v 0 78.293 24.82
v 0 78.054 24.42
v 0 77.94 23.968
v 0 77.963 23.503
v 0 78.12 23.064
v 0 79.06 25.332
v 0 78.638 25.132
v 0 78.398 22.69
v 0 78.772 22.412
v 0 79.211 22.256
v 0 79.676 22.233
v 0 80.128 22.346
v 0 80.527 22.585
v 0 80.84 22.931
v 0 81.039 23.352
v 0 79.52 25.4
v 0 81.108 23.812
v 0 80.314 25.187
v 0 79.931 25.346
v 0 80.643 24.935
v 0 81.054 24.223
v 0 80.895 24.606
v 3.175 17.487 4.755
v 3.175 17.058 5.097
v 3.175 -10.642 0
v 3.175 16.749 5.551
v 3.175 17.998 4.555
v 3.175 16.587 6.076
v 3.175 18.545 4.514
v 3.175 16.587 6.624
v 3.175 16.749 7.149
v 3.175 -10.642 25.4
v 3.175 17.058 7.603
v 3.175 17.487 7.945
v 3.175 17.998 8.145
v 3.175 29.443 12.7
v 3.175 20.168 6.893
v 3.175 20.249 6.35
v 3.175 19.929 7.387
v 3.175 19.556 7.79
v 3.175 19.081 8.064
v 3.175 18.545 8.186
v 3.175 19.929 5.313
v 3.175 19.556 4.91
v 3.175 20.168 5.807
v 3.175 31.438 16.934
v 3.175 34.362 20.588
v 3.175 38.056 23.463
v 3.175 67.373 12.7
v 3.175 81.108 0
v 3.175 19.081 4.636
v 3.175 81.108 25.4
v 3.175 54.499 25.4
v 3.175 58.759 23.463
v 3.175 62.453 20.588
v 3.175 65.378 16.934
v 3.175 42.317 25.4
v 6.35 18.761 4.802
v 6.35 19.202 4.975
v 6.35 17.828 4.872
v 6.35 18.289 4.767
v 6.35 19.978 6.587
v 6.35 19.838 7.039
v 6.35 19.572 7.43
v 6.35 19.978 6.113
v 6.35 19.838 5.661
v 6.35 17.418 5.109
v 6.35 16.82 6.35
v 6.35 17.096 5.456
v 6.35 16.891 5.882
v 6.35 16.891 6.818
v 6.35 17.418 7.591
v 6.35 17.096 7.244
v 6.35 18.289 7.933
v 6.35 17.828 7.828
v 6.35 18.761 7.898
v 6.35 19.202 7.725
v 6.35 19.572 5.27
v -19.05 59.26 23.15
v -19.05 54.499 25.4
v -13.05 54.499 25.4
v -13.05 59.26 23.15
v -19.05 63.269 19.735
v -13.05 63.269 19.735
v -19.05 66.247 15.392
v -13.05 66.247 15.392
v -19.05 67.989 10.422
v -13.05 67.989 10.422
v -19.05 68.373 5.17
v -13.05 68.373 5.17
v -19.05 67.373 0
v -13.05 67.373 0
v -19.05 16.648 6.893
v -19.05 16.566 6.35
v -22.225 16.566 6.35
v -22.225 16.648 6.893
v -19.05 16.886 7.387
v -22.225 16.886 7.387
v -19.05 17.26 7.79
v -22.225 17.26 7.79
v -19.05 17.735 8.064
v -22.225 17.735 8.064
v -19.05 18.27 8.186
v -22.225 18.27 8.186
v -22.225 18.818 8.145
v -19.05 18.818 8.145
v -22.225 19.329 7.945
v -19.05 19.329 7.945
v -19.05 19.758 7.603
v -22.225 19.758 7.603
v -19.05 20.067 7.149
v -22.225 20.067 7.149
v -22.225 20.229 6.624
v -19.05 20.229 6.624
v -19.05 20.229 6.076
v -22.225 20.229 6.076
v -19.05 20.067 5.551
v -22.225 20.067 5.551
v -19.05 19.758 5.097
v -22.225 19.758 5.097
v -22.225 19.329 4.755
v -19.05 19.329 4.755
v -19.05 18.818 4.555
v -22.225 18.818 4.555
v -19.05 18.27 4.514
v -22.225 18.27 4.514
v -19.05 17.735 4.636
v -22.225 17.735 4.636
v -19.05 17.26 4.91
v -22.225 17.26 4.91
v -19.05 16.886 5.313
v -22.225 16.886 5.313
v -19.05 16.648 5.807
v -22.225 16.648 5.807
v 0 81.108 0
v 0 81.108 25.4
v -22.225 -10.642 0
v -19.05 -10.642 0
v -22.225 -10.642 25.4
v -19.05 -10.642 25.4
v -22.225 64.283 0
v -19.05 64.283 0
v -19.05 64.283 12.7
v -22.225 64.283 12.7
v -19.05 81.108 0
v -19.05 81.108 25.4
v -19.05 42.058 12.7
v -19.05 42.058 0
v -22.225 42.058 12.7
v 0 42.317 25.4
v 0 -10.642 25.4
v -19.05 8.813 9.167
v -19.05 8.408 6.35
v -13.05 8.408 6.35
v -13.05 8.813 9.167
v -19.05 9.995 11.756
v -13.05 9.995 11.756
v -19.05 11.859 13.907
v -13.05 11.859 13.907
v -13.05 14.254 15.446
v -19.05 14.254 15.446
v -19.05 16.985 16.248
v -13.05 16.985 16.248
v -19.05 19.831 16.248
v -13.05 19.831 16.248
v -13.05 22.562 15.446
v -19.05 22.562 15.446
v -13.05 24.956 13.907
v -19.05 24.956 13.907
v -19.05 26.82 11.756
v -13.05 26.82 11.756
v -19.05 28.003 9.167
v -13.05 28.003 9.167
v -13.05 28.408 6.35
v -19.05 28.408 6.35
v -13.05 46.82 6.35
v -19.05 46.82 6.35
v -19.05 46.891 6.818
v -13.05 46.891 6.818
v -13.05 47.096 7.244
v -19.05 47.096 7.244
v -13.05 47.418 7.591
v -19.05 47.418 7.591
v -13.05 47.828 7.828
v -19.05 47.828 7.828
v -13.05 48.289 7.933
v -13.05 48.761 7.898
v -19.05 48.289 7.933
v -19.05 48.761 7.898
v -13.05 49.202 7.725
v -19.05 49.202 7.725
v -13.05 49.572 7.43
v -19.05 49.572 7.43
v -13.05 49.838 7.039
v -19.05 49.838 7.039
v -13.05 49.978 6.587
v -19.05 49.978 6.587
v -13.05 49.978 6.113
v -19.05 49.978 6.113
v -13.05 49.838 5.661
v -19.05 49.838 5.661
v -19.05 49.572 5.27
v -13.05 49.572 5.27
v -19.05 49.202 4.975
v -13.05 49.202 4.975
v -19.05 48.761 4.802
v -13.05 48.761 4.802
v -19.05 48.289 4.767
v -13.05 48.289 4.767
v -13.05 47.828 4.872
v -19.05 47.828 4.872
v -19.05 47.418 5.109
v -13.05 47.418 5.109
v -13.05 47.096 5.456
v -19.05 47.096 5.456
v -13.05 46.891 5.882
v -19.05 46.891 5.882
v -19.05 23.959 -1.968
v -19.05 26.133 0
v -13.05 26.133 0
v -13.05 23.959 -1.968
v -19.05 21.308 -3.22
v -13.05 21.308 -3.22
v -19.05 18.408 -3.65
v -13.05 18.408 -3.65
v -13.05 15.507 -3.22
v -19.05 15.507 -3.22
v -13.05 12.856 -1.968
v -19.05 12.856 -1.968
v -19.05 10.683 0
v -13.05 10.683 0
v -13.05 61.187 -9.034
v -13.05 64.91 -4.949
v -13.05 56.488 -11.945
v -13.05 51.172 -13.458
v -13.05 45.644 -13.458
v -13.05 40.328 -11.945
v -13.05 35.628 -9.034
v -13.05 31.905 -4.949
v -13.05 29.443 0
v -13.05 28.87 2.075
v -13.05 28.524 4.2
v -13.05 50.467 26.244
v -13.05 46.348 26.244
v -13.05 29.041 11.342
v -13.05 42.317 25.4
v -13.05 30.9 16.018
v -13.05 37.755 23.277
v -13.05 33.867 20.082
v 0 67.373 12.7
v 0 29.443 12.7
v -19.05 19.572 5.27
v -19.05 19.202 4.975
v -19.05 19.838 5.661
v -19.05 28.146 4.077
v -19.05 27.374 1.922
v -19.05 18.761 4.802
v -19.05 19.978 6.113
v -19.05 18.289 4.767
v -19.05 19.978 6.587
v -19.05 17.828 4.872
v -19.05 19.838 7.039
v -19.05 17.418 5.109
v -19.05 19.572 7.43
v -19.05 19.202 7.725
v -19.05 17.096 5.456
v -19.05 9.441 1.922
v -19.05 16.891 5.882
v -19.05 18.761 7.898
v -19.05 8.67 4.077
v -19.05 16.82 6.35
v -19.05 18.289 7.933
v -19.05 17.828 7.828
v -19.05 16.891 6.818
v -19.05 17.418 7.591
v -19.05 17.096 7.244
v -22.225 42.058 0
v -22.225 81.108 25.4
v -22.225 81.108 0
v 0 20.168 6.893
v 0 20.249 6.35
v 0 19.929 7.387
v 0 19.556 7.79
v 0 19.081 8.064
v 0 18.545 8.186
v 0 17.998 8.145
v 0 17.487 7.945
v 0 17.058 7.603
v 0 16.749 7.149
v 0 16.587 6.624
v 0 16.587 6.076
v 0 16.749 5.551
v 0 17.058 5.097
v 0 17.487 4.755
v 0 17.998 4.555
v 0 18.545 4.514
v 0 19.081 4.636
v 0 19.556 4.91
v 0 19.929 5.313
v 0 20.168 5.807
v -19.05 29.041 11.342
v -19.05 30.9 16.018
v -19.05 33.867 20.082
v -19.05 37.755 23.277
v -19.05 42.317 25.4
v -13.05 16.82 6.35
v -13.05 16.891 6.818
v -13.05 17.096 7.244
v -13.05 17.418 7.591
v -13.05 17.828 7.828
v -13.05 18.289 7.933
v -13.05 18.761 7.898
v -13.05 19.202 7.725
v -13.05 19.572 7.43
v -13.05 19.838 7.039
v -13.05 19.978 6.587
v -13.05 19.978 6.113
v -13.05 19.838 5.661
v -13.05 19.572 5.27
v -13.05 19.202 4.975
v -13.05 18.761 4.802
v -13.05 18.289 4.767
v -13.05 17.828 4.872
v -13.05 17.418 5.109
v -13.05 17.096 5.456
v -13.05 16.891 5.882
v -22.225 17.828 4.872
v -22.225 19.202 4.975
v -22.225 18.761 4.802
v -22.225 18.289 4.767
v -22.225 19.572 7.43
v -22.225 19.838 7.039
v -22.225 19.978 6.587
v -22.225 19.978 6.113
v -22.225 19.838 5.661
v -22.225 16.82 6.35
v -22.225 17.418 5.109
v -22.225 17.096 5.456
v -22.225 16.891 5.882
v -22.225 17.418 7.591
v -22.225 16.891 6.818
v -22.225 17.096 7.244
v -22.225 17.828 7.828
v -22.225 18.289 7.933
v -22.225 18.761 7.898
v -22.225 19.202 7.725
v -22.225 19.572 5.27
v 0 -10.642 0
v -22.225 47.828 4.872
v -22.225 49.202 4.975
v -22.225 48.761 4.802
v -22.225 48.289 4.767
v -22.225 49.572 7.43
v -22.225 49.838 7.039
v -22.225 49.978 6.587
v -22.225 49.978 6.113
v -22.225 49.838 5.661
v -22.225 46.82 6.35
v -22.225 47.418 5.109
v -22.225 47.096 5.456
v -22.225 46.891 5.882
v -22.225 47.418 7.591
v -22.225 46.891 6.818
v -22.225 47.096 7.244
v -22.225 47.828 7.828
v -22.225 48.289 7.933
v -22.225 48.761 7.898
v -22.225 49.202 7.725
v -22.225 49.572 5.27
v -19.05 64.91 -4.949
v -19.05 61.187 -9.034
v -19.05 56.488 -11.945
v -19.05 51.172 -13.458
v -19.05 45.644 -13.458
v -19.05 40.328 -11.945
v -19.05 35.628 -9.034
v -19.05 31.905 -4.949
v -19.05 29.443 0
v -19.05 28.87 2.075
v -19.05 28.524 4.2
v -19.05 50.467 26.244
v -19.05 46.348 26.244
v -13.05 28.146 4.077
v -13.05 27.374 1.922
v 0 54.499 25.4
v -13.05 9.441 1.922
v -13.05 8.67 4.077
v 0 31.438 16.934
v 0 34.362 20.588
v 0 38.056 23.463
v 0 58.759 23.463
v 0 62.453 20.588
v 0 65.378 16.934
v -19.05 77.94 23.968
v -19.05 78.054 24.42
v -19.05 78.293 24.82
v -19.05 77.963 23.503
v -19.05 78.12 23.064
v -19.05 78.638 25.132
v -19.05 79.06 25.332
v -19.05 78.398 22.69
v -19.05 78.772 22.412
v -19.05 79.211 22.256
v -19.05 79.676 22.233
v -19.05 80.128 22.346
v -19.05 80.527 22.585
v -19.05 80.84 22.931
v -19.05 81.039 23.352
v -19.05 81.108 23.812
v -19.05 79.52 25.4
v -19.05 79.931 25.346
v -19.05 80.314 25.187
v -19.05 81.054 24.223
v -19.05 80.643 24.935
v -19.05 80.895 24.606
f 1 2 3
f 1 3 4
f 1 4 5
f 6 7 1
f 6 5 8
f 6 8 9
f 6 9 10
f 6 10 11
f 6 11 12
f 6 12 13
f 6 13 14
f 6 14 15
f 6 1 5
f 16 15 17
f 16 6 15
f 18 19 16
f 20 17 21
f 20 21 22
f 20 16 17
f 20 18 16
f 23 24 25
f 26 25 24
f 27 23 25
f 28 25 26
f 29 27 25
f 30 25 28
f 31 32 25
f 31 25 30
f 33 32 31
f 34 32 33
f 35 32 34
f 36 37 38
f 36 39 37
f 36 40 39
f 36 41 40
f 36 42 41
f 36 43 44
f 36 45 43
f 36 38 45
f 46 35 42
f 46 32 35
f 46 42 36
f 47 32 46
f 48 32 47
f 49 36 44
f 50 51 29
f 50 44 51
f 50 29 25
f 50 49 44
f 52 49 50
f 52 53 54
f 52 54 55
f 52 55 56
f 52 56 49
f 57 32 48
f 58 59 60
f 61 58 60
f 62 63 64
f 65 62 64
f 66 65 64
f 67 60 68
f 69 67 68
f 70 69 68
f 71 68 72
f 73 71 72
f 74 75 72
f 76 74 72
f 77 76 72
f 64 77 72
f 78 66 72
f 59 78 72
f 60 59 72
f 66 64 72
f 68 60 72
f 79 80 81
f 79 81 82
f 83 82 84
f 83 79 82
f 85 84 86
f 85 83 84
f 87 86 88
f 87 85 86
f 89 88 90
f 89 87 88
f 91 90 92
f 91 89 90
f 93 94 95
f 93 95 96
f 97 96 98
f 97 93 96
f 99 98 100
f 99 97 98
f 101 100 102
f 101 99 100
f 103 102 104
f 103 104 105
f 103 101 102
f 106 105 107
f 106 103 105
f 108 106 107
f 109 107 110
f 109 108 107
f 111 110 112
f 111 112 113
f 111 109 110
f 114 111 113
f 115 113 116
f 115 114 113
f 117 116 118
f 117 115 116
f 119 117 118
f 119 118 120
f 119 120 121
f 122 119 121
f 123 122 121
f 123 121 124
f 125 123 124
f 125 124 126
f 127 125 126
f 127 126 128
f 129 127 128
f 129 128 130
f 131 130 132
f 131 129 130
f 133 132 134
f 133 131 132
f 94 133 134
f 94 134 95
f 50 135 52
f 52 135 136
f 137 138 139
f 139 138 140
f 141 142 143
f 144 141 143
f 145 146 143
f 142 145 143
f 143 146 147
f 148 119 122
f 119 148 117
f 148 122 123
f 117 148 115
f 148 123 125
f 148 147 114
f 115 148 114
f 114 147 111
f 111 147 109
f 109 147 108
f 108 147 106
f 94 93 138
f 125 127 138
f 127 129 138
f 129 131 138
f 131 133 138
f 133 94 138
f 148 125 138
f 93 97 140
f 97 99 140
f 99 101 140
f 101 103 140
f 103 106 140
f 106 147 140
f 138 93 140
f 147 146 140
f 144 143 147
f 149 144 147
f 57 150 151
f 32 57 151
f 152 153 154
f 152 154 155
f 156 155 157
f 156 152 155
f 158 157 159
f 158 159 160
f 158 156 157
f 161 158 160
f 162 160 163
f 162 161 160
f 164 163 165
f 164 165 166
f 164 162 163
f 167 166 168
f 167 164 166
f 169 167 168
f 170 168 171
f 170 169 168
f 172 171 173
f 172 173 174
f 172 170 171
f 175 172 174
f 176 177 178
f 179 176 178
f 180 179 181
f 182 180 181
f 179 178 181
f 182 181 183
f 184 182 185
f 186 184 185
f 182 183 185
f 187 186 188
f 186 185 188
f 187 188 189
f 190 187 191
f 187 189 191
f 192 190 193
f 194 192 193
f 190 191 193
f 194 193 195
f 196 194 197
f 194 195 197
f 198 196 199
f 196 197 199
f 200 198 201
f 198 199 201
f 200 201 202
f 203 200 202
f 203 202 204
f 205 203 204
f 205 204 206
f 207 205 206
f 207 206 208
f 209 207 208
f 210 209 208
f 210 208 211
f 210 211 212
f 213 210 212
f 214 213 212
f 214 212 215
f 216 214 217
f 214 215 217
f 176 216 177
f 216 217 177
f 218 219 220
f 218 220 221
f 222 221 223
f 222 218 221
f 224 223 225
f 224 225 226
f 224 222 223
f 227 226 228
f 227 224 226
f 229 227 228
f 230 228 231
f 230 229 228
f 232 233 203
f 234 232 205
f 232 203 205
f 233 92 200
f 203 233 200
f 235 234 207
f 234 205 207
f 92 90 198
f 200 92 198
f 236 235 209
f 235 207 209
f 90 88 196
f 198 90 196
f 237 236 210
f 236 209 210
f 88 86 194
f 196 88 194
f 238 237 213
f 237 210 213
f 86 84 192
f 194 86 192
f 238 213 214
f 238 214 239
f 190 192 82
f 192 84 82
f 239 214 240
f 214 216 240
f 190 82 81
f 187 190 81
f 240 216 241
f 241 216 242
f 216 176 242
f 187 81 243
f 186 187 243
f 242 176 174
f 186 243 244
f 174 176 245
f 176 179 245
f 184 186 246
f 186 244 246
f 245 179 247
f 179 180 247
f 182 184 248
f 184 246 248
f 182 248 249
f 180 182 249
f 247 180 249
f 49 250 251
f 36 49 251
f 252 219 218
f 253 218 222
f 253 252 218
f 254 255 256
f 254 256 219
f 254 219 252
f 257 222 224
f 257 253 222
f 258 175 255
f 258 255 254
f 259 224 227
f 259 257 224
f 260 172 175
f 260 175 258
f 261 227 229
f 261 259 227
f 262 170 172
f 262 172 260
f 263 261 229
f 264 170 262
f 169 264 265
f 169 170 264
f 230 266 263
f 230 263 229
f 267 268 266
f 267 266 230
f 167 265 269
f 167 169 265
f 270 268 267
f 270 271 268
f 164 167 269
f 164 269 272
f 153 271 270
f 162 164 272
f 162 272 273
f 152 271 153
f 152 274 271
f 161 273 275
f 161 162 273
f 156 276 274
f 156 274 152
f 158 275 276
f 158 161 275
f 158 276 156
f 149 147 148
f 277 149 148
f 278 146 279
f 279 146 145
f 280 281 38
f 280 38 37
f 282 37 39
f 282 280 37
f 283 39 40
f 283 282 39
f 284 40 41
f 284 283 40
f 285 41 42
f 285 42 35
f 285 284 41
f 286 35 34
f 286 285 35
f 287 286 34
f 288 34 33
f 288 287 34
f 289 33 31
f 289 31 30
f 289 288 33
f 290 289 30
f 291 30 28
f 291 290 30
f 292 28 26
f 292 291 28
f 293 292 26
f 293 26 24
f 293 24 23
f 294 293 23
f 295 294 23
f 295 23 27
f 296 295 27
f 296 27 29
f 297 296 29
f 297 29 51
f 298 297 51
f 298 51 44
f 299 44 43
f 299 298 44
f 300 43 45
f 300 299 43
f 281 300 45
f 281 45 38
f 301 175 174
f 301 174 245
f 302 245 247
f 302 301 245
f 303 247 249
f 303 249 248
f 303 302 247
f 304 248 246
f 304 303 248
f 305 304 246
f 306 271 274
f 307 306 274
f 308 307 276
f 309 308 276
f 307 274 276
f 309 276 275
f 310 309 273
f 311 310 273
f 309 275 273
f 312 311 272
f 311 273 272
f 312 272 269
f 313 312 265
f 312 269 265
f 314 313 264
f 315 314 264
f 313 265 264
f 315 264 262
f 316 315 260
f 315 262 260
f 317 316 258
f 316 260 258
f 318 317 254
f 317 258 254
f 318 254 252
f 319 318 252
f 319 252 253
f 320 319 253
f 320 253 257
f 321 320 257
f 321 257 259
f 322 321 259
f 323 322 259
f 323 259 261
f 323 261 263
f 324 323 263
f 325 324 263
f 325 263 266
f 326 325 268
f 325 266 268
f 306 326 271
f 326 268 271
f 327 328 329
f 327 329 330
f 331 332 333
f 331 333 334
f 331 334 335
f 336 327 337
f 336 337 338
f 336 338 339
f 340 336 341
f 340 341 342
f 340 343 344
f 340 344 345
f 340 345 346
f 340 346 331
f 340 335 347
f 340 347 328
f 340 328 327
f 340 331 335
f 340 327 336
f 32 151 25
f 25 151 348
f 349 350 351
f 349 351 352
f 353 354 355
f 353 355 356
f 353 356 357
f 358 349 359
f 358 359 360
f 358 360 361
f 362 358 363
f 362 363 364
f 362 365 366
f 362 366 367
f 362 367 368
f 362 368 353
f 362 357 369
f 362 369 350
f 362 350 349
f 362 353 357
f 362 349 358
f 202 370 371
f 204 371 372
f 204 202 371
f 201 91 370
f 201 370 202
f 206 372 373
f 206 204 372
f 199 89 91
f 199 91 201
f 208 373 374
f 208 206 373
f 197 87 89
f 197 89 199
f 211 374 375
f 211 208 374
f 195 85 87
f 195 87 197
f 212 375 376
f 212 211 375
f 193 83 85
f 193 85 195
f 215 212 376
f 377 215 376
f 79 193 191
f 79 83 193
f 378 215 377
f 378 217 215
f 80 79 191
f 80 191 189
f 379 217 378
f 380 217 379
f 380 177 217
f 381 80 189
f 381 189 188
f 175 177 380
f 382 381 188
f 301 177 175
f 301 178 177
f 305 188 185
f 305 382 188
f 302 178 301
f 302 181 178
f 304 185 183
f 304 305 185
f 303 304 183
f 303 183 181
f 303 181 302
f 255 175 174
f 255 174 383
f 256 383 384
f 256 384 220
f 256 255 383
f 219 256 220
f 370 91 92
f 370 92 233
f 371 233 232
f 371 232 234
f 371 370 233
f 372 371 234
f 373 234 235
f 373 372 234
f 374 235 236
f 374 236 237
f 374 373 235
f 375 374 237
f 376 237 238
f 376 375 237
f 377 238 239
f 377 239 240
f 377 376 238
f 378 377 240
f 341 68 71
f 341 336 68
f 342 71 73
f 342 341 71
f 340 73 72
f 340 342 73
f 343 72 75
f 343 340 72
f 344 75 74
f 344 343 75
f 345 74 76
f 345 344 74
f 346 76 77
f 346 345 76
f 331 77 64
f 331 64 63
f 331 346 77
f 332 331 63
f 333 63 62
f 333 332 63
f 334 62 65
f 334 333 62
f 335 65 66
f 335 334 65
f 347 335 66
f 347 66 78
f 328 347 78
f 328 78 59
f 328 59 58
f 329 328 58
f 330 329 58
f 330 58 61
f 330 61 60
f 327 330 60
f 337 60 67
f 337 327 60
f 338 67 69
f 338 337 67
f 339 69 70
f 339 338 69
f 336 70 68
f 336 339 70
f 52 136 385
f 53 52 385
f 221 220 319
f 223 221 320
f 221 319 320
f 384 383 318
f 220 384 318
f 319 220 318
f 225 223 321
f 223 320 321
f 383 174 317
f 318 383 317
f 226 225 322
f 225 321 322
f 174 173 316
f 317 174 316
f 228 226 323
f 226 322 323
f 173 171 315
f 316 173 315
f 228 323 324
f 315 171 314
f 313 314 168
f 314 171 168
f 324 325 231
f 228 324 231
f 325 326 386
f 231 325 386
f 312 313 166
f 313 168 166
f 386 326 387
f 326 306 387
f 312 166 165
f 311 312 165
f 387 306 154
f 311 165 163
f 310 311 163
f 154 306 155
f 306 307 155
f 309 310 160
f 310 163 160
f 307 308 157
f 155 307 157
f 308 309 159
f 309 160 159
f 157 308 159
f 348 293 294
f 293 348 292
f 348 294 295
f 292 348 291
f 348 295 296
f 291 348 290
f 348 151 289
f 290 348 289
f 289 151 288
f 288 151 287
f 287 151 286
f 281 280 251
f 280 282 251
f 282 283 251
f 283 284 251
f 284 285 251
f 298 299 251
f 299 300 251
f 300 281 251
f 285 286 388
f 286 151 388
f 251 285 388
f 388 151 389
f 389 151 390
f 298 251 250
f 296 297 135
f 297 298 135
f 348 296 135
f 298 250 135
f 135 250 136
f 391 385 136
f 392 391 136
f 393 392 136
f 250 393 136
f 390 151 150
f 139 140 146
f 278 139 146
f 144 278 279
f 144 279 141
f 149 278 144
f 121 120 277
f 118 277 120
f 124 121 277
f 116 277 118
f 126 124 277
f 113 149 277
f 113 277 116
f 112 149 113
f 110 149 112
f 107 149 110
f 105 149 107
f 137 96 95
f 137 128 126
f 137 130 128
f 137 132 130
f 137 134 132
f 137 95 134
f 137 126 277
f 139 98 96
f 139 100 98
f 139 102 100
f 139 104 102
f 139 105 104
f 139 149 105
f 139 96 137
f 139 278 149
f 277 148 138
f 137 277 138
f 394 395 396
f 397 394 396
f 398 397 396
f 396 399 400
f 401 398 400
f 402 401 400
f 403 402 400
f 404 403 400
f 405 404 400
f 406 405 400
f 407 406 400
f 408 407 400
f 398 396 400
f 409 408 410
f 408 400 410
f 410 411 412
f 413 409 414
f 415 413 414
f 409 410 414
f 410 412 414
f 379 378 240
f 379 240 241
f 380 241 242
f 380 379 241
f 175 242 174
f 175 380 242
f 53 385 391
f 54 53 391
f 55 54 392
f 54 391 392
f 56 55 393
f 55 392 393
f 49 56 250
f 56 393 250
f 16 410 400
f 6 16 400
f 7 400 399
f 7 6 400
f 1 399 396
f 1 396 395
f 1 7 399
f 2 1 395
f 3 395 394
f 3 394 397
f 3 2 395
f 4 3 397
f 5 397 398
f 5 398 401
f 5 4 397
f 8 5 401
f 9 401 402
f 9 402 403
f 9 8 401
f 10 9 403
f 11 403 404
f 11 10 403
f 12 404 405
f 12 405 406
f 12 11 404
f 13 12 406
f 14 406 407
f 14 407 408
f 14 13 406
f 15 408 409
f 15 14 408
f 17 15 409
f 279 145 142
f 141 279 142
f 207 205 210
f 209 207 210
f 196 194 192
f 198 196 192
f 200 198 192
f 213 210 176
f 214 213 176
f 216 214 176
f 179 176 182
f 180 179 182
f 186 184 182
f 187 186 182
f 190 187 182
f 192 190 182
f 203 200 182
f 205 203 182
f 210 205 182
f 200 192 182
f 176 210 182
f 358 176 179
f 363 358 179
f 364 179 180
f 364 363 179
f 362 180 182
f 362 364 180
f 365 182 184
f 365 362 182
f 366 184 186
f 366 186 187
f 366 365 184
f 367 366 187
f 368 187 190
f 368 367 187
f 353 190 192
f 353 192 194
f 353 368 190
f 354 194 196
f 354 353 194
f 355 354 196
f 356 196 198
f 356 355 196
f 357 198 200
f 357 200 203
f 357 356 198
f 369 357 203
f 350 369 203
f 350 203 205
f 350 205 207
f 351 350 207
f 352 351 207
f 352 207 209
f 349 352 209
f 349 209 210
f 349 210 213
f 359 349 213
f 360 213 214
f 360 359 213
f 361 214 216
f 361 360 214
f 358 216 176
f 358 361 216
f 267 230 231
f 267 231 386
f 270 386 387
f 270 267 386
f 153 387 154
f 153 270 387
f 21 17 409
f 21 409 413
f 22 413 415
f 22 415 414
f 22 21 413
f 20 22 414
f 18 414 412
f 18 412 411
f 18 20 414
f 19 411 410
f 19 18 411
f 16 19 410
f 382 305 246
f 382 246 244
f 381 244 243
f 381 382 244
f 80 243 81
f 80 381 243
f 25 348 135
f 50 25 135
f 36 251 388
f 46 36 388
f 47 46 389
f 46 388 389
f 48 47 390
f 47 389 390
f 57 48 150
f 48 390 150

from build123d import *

# Parameters (mm, degrees)
F0_R      = 1.8415
F0_R_2    = 1.5875
F1_DEPTH  = 3.175
F2_DEPTH  = 19.05
F3_R      = 1.8415
F4_DEPTH  = 3.175
F3_R_2    = 1.5875
F5_DEPTH  = 3.175
F6_DEPTH  = 6
F7_DEPTH  = 6
F8_DEPTH  = 3.175
F9_DEPTH  = 25.4
F10_DEPTH = 6


# Not quite as in the source:
# - a feature names something its author has since deleted; it is built from what else it names


with BuildPart() as f1:
    # F0 (on Right) → F1 (new body)
    with BuildSketch(Plane.YZ):
        with BuildLine():
            Line((26.1329581332, 12.7), (29.4426713393, 12.7))
            ThreePointArc((29.4426713393, 12.7), (34.3624639947, 20.5882408837), (42.3170650669, 25.4))
            Line((42.3170650669, 25.4), (41.8216693056, 25.4))
            Line((41.8216693056, 25.4), (35.8211970083, 25.4))
            Line((35.8211970083, 25.4), (-10.6421632251, 25.4))
            Line((-10.6421632251, 25.4), (-10.6421632251, 0))
            Line((-10.6421632251, 0), (10.6827154167, 0))
            ThreePointArc((10.6827154167, 0), (12.0578367749, 14.0751213583), (26.1329581332, 12.7))
        make_face()
        with BuildLine():
            ThreePointArc((67.3730022106, 0), (68.1474328791, 3.1331155377), (68.4078367749, 6.35))
            ThreePointArc((68.4078367749, 6.35), (68.1474328791, 9.5668844623), (67.3730022106, 12.7))
            Line((67.3730022106, 12.7), (29.4426713393, 12.7))
            ThreePointArc((29.4426713393, 12.7), (28.6682406708, 9.5668844623), (28.4078367749, 6.35))
            ThreePointArc((28.4078367749, 6.35), (28.6682406708, 3.1331155377), (29.4426713393, 0))
            Line((29.4426713393, 0), (67.3730022106, 0))
        make_face()
        with Locations((48.4078367749, 6.35)):
            Circle(F0_R, mode=Mode.SUBTRACT)
        with BuildLine():
            ThreePointArc((54.498608483, 25.4), (62.4532095552, 20.5882408837), (67.3730022106, 12.7))
            Line((67.3730022106, 12.7), (74.2828367749, 12.7))
            Line((74.2828367749, 12.7), (74.2828367749, 0))
            Line((74.2828367749, 0), (80.2833090723, 0))
            Line((80.2833090723, 0), (81.1078367749, 0))
            Line((81.1078367749, 0), (81.1078367749, 23.8125))
            ThreePointArc((81.1078367749, 23.8125), (78.3978047598, 22.6899679849), (79.5203367749, 25.4))
            Line((79.5203367749, 25.4), (54.498608483, 25.4))
        make_face()
        with BuildLine():
            Line((22.0578367749, 12.7), (26.1329581332, 12.7))
            ThreePointArc((26.1329581332, 12.7), (12.0578367749, 14.0751213583), (10.6827154167, 0))
            Line((10.6827154167, 0), (22.0578367749, 0))
            Line((22.0578367749, 0), (22.0578367749, 12.7))
        make_face()
        with Locations((18.4078367749, 6.35)):
            Circle(F0_R, mode=Mode.SUBTRACT)
        with BuildLine():
            ThreePointArc((67.3730022106, 12.7), (68.1474328791, 9.5668844623), (68.4078367749, 6.35))
            ThreePointArc((68.4078367749, 6.35), (68.1474328791, 3.1331155377), (67.3730022106, 0))
            Line((67.3730022106, 0), (73.4878367749, 0))
            Line((73.4878367749, 0), (74.2828367749, 0))
            Line((74.2828367749, 0), (74.2828367749, 12.7))
            Line((74.2828367749, 12.7), (67.3730022106, 12.7))
        make_face()
        with BuildLine():
            ThreePointArc((26.1329581332, 0), (27.8219541946, 2.9774055671), (28.4078367749, 6.35))
            ThreePointArc((28.4078367749, 6.35), (27.8219541946, 9.7225944329), (26.1329581332, 12.7))
            Line((26.1329581332, 12.7), (22.0578367749, 12.7))
            Line((22.0578367749, 12.7), (22.0578367749, 0))
            Line((22.0578367749, 0), (26.1329581332, 0))
        make_face()
        with Locations((48.4078367749, 6.35)):
            Circle(F0_R)
        with Locations((48.4078367749, 6.35)):
            Circle(F0_R_2, mode=Mode.SUBTRACT)
        with Locations((48.4078367749, 6.35)):
            Circle(F0_R_2)
        with BuildLine():
            ThreePointArc((81.1078367749, 23.8125), (80.6428687901, 24.9350320151), (79.5203367749, 25.4))
            ThreePointArc((79.5203367749, 25.4), (78.3978047598, 22.6899679849), (81.1078367749, 23.8125))
        make_face()
        with BuildLine():
            ThreePointArc((28.4078367749, 6.35), (28.6682406708, 9.5668844623), (29.4426713393, 12.7))
            Line((29.4426713393, 12.7), (26.1329581332, 12.7))
            ThreePointArc((26.1329581332, 12.7), (27.8219541946, 9.7225944329), (28.4078367749, 6.35))
        make_face()
        with BuildLine():
            Line((26.1329581332, 0), (29.4426713393, 0))
            ThreePointArc((29.4426713393, 0), (28.6682406708, 3.1331155377), (28.4078367749, 6.35))
            ThreePointArc((28.4078367749, 6.35), (27.8219541946, 2.9774055671), (26.1329581332, 0))
        make_face()
        with BuildLine():
            Line((81.1078367749, 25.4), (79.5203367749, 25.4))
            ThreePointArc((79.5203367749, 25.4), (80.6428687901, 24.9350320151), (81.1078367749, 23.8125))
            Line((81.1078367749, 23.8125), (81.1078367749, 25.4))
        make_face()
    extrude(amount=F1_DEPTH)


with BuildPart() as f2:
    # F0 (on Right) → F2 (new body)
    with BuildSketch(Plane.YZ):
        with BuildLine():
            ThreePointArc((81.1078367749, 23.8125), (80.6428687901, 24.9350320151), (79.5203367749, 25.4))
            ThreePointArc((79.5203367749, 25.4), (78.3978047598, 22.6899679849), (81.1078367749, 23.8125))
        make_face()
    extrude(amount=-F2_DEPTH)


with BuildPart() as f4:
    # F3 (on face) → F4 (new body)
    with BuildSketch(Plane(origin=(-19.05, 0, 0), x_dir=(0, -1, 0), z_dir=(-1, 0, 0))):
        with BuildLine():
            Line((-79.5203367749, 25.4), (-81.1078367749, 25.4))
            Line((-81.1078367749, 25.4), (-81.1078367749, 23.8125))
            ThreePointArc((-81.1078367749, 23.8125), (-80.6428687901, 24.9350320151), (-79.5203367749, 25.4))
        make_face()
        with BuildLine():
            Line((-54.498608483, 25.4), (-79.5203367749, 25.4))
            ThreePointArc((-79.5203367749, 25.4), (-78.3978047598, 24.9350320151), (-77.9328367749, 23.8125))
            ThreePointArc((-77.9328367749, 23.8125), (-79.5203367749, 22.225), (-81.1078367749, 23.8125))
            Line((-81.1078367749, 23.8125), (-81.1078367749, 0))
            Line((-81.1078367749, 0), (-67.3730022106, 0))
            ThreePointArc((-67.3730022106, 0), (-66.2471191747, 15.3921238358), (-54.498608483, 25.4))
        make_face()
        with BuildLine():
            ThreePointArc((-77.9328367749, 23.8125), (-78.3978047598, 24.9350320151), (-79.5203367749, 25.4))
            ThreePointArc((-79.5203367749, 25.4), (-80.6428687901, 24.9350320151), (-81.1078367749, 23.8125))
            ThreePointArc((-81.1078367749, 23.8125), (-79.5203367749, 22.225), (-77.9328367749, 23.8125))
        make_face()
        with BuildLine():
            Line((-42.3170650669, 25.4), (-54.498608483, 25.4))
            ThreePointArc((-54.498608483, 25.4), (-66.2471191747, 15.3921238358), (-67.3730022106, 0))
            Line((-67.3730022106, 0), (-64.2828367749, 0))
            Line((-64.2828367749, 0), (-64.2828367749, 12.7))
            Line((-64.2828367749, 12.7), (-42.0578367749, 12.7))
            Line((-42.0578367749, 12.7), (-42.0578367749, 6.35))
            Line((-42.0578367749, 6.35), (-42.0578367749, 0))
            Line((-42.0578367749, 0), (-29.4426713393, 0))
            ThreePointArc((-29.4426713393, 0), (-28.6682406708, 3.1331155377), (-28.4078367749, 6.35))
            ThreePointArc((-28.4078367749, 6.35), (-32.2551986907, 18.1437391407), (-42.3170650669, 25.4))
        make_face()
        with BuildLine():
            Line((10.6421632251, 25.4), (-42.3170650669, 25.4))
            ThreePointArc((-42.3170650669, 25.4), (-32.2551986907, 18.1437391407), (-28.4078367749, 6.35))
            ThreePointArc((-28.4078367749, 6.35), (-18.4078367749, 16.35), (-8.4078367749, 6.35))
            ThreePointArc((-8.4078367749, 6.35), (-8.9937193553, 2.9774055671), (-10.6827154167, 0))
            Line((-10.6827154167, 0), (10.6421632251, 0))
            Line((10.6421632251, 0), (10.6421632251, 25.4))
        make_face()
        with BuildLine():
            ThreePointArc((-26.1329581332, 0), (-27.8219541946, 2.9774055671), (-28.4078367749, 6.35))
            ThreePointArc((-28.4078367749, 6.35), (-28.6682406708, 3.1331155377), (-29.4426713393, 0))
            Line((-29.4426713393, 0), (-26.1329581332, 0))
        make_face()
        with BuildLine():
            ThreePointArc((-8.4078367749, 6.35), (-18.4078367749, 16.35), (-28.4078367749, 6.35))
            ThreePointArc((-28.4078367749, 6.35), (-27.8219541946, 2.9774055671), (-26.1329581332, 0))
            Line((-26.1329581332, 0), (-10.6827154167, 0))
            ThreePointArc((-10.6827154167, 0), (-8.9937193553, 2.9774055671), (-8.4078367749, 6.35))
        make_face()
        with Locations((-18.4078367749, 6.35)):
            Circle(F3_R, mode=Mode.SUBTRACT)
    extrude(amount=F4_DEPTH)


with BuildPart() as f5:
    # F3 (on face) → F5 (new body)
    with BuildSketch(Plane(origin=(-19.05, 0, 0), x_dir=(0, -1, 0), z_dir=(-1, 0, 0))):
        with Locations((-48.4078367749, 6.35)):
            Circle(F3_R_2)
    extrude(amount=F5_DEPTH)

    # F3 (on face) → F6 (join)
    with BuildSketch(Plane(origin=(-19.05, 0, 0), x_dir=(0, -1, 0), z_dir=(-1, 0, 0))):
        with Locations((-48.4078367749, 6.35)):
            Circle(F3_R_2)
    extrude(amount=-F6_DEPTH)


with BuildPart() as f7:
    # F3 (on face) → F7 (new body)
    with BuildSketch(Plane(origin=(-19.05, 0, 0), x_dir=(0, -1, 0), z_dir=(-1, 0, 0))):
        with BuildLine():
            Line((-42.3170650669, 25.4), (-54.498608483, 25.4))
            ThreePointArc((-54.498608483, 25.4), (-66.2471191747, 15.3921238358), (-67.3730022106, 0))
            Line((-67.3730022106, 0), (-64.2828367749, 0))
            Line((-64.2828367749, 0), (-64.2828367749, 12.7))
            Line((-64.2828367749, 12.7), (-42.0578367749, 12.7))
            Line((-42.0578367749, 12.7), (-42.0578367749, 6.35))
            Line((-42.0578367749, 6.35), (-42.0578367749, 0))
            Line((-42.0578367749, 0), (-29.4426713393, 0))
            ThreePointArc((-29.4426713393, 0), (-28.6682406708, 3.1331155377), (-28.4078367749, 6.35))
            ThreePointArc((-28.4078367749, 6.35), (-32.2551986907, 18.1437391407), (-42.3170650669, 25.4))
        make_face()
        with BuildLine():
            Line((-64.2828367749, 0), (-67.3730022106, 0))
            ThreePointArc((-67.3730022106, 0), (-48.4078367749, -13.65), (-29.4426713393, 0))
            Line((-29.4426713393, 0), (-42.0578367749, 0))
            Line((-42.0578367749, 0), (-64.2828367749, 0))
        make_face()
        Polygon((-64.2828367749, 12.7), (-64.2828367749, 0), (-42.0578367749, 0), (-42.0578367749, 6.35), (-42.0578367749, 12.7), align=None)
        with Locations((-48.4078367749, 6.35)):
            Circle(F3_R, mode=Mode.SUBTRACT)
        with Locations((-48.4078367749, 6.35)):
            Circle(F3_R)
        with Locations((-48.4078367749, 6.35)):
            Circle(F3_R_2, mode=Mode.SUBTRACT)
        with BuildLine():
            ThreePointArc((-42.3170650669, 25.4), (-48.4078367749, 26.35), (-54.498608483, 25.4))
            Line((-54.498608483, 25.4), (-42.3170650669, 25.4))
        make_face()
    extrude(amount=-F7_DEPTH)


with BuildPart() as f8:
    # F3 (on face) → F8 (new body)
    with BuildSketch(Plane(origin=(-19.05, 0, 0), x_dir=(0, -1, 0), z_dir=(-1, 0, 0))):
        with Locations((-18.4078367749, 6.35)):
            Circle(F3_R_2)
    extrude(amount=F8_DEPTH)

    # F3 (on face) → F9 (join)
    with BuildSketch(Plane(origin=(-19.05, 0, 0), x_dir=(0, -1, 0), z_dir=(-1, 0, 0))):
        with Locations((-18.4078367749, 6.35)):
            Circle(F3_R_2)
    extrude(amount=-F9_DEPTH)


with BuildPart() as f10:
    # F3 (on face) → F10 (new body)
    with BuildSketch(Plane(origin=(-19.05, 0, 0), x_dir=(0, -1, 0), z_dir=(-1, 0, 0))):
        with BuildLine():
            ThreePointArc((-8.4078367749, 6.35), (-18.4078367749, 16.35), (-28.4078367749, 6.35))
            ThreePointArc((-28.4078367749, 6.35), (-27.8219541946, 2.9774055671), (-26.1329581332, 0))
            Line((-26.1329581332, 0), (-10.6827154167, 0))
            ThreePointArc((-10.6827154167, 0), (-8.9937193553, 2.9774055671), (-8.4078367749, 6.35))
        make_face()
        with Locations((-18.4078367749, 6.35)):
            Circle(F3_R, mode=Mode.SUBTRACT)
        with Locations((-18.4078367749, 6.35)):
            Circle(F3_R)
        with Locations((-18.4078367749, 6.35)):
            Circle(F3_R_2, mode=Mode.SUBTRACT)
        with BuildLine():
            Line((-10.6827154167, 0), (-26.1329581332, 0))
            ThreePointArc((-26.1329581332, 0), (-18.4078367749, -3.65), (-10.6827154167, 0))
        make_face()
    extrude(amount=-F10_DEPTH)


solid = Compound([f1.part, f2.part, f4.part, f5.part, f7.part, f8.part, f10.part])
